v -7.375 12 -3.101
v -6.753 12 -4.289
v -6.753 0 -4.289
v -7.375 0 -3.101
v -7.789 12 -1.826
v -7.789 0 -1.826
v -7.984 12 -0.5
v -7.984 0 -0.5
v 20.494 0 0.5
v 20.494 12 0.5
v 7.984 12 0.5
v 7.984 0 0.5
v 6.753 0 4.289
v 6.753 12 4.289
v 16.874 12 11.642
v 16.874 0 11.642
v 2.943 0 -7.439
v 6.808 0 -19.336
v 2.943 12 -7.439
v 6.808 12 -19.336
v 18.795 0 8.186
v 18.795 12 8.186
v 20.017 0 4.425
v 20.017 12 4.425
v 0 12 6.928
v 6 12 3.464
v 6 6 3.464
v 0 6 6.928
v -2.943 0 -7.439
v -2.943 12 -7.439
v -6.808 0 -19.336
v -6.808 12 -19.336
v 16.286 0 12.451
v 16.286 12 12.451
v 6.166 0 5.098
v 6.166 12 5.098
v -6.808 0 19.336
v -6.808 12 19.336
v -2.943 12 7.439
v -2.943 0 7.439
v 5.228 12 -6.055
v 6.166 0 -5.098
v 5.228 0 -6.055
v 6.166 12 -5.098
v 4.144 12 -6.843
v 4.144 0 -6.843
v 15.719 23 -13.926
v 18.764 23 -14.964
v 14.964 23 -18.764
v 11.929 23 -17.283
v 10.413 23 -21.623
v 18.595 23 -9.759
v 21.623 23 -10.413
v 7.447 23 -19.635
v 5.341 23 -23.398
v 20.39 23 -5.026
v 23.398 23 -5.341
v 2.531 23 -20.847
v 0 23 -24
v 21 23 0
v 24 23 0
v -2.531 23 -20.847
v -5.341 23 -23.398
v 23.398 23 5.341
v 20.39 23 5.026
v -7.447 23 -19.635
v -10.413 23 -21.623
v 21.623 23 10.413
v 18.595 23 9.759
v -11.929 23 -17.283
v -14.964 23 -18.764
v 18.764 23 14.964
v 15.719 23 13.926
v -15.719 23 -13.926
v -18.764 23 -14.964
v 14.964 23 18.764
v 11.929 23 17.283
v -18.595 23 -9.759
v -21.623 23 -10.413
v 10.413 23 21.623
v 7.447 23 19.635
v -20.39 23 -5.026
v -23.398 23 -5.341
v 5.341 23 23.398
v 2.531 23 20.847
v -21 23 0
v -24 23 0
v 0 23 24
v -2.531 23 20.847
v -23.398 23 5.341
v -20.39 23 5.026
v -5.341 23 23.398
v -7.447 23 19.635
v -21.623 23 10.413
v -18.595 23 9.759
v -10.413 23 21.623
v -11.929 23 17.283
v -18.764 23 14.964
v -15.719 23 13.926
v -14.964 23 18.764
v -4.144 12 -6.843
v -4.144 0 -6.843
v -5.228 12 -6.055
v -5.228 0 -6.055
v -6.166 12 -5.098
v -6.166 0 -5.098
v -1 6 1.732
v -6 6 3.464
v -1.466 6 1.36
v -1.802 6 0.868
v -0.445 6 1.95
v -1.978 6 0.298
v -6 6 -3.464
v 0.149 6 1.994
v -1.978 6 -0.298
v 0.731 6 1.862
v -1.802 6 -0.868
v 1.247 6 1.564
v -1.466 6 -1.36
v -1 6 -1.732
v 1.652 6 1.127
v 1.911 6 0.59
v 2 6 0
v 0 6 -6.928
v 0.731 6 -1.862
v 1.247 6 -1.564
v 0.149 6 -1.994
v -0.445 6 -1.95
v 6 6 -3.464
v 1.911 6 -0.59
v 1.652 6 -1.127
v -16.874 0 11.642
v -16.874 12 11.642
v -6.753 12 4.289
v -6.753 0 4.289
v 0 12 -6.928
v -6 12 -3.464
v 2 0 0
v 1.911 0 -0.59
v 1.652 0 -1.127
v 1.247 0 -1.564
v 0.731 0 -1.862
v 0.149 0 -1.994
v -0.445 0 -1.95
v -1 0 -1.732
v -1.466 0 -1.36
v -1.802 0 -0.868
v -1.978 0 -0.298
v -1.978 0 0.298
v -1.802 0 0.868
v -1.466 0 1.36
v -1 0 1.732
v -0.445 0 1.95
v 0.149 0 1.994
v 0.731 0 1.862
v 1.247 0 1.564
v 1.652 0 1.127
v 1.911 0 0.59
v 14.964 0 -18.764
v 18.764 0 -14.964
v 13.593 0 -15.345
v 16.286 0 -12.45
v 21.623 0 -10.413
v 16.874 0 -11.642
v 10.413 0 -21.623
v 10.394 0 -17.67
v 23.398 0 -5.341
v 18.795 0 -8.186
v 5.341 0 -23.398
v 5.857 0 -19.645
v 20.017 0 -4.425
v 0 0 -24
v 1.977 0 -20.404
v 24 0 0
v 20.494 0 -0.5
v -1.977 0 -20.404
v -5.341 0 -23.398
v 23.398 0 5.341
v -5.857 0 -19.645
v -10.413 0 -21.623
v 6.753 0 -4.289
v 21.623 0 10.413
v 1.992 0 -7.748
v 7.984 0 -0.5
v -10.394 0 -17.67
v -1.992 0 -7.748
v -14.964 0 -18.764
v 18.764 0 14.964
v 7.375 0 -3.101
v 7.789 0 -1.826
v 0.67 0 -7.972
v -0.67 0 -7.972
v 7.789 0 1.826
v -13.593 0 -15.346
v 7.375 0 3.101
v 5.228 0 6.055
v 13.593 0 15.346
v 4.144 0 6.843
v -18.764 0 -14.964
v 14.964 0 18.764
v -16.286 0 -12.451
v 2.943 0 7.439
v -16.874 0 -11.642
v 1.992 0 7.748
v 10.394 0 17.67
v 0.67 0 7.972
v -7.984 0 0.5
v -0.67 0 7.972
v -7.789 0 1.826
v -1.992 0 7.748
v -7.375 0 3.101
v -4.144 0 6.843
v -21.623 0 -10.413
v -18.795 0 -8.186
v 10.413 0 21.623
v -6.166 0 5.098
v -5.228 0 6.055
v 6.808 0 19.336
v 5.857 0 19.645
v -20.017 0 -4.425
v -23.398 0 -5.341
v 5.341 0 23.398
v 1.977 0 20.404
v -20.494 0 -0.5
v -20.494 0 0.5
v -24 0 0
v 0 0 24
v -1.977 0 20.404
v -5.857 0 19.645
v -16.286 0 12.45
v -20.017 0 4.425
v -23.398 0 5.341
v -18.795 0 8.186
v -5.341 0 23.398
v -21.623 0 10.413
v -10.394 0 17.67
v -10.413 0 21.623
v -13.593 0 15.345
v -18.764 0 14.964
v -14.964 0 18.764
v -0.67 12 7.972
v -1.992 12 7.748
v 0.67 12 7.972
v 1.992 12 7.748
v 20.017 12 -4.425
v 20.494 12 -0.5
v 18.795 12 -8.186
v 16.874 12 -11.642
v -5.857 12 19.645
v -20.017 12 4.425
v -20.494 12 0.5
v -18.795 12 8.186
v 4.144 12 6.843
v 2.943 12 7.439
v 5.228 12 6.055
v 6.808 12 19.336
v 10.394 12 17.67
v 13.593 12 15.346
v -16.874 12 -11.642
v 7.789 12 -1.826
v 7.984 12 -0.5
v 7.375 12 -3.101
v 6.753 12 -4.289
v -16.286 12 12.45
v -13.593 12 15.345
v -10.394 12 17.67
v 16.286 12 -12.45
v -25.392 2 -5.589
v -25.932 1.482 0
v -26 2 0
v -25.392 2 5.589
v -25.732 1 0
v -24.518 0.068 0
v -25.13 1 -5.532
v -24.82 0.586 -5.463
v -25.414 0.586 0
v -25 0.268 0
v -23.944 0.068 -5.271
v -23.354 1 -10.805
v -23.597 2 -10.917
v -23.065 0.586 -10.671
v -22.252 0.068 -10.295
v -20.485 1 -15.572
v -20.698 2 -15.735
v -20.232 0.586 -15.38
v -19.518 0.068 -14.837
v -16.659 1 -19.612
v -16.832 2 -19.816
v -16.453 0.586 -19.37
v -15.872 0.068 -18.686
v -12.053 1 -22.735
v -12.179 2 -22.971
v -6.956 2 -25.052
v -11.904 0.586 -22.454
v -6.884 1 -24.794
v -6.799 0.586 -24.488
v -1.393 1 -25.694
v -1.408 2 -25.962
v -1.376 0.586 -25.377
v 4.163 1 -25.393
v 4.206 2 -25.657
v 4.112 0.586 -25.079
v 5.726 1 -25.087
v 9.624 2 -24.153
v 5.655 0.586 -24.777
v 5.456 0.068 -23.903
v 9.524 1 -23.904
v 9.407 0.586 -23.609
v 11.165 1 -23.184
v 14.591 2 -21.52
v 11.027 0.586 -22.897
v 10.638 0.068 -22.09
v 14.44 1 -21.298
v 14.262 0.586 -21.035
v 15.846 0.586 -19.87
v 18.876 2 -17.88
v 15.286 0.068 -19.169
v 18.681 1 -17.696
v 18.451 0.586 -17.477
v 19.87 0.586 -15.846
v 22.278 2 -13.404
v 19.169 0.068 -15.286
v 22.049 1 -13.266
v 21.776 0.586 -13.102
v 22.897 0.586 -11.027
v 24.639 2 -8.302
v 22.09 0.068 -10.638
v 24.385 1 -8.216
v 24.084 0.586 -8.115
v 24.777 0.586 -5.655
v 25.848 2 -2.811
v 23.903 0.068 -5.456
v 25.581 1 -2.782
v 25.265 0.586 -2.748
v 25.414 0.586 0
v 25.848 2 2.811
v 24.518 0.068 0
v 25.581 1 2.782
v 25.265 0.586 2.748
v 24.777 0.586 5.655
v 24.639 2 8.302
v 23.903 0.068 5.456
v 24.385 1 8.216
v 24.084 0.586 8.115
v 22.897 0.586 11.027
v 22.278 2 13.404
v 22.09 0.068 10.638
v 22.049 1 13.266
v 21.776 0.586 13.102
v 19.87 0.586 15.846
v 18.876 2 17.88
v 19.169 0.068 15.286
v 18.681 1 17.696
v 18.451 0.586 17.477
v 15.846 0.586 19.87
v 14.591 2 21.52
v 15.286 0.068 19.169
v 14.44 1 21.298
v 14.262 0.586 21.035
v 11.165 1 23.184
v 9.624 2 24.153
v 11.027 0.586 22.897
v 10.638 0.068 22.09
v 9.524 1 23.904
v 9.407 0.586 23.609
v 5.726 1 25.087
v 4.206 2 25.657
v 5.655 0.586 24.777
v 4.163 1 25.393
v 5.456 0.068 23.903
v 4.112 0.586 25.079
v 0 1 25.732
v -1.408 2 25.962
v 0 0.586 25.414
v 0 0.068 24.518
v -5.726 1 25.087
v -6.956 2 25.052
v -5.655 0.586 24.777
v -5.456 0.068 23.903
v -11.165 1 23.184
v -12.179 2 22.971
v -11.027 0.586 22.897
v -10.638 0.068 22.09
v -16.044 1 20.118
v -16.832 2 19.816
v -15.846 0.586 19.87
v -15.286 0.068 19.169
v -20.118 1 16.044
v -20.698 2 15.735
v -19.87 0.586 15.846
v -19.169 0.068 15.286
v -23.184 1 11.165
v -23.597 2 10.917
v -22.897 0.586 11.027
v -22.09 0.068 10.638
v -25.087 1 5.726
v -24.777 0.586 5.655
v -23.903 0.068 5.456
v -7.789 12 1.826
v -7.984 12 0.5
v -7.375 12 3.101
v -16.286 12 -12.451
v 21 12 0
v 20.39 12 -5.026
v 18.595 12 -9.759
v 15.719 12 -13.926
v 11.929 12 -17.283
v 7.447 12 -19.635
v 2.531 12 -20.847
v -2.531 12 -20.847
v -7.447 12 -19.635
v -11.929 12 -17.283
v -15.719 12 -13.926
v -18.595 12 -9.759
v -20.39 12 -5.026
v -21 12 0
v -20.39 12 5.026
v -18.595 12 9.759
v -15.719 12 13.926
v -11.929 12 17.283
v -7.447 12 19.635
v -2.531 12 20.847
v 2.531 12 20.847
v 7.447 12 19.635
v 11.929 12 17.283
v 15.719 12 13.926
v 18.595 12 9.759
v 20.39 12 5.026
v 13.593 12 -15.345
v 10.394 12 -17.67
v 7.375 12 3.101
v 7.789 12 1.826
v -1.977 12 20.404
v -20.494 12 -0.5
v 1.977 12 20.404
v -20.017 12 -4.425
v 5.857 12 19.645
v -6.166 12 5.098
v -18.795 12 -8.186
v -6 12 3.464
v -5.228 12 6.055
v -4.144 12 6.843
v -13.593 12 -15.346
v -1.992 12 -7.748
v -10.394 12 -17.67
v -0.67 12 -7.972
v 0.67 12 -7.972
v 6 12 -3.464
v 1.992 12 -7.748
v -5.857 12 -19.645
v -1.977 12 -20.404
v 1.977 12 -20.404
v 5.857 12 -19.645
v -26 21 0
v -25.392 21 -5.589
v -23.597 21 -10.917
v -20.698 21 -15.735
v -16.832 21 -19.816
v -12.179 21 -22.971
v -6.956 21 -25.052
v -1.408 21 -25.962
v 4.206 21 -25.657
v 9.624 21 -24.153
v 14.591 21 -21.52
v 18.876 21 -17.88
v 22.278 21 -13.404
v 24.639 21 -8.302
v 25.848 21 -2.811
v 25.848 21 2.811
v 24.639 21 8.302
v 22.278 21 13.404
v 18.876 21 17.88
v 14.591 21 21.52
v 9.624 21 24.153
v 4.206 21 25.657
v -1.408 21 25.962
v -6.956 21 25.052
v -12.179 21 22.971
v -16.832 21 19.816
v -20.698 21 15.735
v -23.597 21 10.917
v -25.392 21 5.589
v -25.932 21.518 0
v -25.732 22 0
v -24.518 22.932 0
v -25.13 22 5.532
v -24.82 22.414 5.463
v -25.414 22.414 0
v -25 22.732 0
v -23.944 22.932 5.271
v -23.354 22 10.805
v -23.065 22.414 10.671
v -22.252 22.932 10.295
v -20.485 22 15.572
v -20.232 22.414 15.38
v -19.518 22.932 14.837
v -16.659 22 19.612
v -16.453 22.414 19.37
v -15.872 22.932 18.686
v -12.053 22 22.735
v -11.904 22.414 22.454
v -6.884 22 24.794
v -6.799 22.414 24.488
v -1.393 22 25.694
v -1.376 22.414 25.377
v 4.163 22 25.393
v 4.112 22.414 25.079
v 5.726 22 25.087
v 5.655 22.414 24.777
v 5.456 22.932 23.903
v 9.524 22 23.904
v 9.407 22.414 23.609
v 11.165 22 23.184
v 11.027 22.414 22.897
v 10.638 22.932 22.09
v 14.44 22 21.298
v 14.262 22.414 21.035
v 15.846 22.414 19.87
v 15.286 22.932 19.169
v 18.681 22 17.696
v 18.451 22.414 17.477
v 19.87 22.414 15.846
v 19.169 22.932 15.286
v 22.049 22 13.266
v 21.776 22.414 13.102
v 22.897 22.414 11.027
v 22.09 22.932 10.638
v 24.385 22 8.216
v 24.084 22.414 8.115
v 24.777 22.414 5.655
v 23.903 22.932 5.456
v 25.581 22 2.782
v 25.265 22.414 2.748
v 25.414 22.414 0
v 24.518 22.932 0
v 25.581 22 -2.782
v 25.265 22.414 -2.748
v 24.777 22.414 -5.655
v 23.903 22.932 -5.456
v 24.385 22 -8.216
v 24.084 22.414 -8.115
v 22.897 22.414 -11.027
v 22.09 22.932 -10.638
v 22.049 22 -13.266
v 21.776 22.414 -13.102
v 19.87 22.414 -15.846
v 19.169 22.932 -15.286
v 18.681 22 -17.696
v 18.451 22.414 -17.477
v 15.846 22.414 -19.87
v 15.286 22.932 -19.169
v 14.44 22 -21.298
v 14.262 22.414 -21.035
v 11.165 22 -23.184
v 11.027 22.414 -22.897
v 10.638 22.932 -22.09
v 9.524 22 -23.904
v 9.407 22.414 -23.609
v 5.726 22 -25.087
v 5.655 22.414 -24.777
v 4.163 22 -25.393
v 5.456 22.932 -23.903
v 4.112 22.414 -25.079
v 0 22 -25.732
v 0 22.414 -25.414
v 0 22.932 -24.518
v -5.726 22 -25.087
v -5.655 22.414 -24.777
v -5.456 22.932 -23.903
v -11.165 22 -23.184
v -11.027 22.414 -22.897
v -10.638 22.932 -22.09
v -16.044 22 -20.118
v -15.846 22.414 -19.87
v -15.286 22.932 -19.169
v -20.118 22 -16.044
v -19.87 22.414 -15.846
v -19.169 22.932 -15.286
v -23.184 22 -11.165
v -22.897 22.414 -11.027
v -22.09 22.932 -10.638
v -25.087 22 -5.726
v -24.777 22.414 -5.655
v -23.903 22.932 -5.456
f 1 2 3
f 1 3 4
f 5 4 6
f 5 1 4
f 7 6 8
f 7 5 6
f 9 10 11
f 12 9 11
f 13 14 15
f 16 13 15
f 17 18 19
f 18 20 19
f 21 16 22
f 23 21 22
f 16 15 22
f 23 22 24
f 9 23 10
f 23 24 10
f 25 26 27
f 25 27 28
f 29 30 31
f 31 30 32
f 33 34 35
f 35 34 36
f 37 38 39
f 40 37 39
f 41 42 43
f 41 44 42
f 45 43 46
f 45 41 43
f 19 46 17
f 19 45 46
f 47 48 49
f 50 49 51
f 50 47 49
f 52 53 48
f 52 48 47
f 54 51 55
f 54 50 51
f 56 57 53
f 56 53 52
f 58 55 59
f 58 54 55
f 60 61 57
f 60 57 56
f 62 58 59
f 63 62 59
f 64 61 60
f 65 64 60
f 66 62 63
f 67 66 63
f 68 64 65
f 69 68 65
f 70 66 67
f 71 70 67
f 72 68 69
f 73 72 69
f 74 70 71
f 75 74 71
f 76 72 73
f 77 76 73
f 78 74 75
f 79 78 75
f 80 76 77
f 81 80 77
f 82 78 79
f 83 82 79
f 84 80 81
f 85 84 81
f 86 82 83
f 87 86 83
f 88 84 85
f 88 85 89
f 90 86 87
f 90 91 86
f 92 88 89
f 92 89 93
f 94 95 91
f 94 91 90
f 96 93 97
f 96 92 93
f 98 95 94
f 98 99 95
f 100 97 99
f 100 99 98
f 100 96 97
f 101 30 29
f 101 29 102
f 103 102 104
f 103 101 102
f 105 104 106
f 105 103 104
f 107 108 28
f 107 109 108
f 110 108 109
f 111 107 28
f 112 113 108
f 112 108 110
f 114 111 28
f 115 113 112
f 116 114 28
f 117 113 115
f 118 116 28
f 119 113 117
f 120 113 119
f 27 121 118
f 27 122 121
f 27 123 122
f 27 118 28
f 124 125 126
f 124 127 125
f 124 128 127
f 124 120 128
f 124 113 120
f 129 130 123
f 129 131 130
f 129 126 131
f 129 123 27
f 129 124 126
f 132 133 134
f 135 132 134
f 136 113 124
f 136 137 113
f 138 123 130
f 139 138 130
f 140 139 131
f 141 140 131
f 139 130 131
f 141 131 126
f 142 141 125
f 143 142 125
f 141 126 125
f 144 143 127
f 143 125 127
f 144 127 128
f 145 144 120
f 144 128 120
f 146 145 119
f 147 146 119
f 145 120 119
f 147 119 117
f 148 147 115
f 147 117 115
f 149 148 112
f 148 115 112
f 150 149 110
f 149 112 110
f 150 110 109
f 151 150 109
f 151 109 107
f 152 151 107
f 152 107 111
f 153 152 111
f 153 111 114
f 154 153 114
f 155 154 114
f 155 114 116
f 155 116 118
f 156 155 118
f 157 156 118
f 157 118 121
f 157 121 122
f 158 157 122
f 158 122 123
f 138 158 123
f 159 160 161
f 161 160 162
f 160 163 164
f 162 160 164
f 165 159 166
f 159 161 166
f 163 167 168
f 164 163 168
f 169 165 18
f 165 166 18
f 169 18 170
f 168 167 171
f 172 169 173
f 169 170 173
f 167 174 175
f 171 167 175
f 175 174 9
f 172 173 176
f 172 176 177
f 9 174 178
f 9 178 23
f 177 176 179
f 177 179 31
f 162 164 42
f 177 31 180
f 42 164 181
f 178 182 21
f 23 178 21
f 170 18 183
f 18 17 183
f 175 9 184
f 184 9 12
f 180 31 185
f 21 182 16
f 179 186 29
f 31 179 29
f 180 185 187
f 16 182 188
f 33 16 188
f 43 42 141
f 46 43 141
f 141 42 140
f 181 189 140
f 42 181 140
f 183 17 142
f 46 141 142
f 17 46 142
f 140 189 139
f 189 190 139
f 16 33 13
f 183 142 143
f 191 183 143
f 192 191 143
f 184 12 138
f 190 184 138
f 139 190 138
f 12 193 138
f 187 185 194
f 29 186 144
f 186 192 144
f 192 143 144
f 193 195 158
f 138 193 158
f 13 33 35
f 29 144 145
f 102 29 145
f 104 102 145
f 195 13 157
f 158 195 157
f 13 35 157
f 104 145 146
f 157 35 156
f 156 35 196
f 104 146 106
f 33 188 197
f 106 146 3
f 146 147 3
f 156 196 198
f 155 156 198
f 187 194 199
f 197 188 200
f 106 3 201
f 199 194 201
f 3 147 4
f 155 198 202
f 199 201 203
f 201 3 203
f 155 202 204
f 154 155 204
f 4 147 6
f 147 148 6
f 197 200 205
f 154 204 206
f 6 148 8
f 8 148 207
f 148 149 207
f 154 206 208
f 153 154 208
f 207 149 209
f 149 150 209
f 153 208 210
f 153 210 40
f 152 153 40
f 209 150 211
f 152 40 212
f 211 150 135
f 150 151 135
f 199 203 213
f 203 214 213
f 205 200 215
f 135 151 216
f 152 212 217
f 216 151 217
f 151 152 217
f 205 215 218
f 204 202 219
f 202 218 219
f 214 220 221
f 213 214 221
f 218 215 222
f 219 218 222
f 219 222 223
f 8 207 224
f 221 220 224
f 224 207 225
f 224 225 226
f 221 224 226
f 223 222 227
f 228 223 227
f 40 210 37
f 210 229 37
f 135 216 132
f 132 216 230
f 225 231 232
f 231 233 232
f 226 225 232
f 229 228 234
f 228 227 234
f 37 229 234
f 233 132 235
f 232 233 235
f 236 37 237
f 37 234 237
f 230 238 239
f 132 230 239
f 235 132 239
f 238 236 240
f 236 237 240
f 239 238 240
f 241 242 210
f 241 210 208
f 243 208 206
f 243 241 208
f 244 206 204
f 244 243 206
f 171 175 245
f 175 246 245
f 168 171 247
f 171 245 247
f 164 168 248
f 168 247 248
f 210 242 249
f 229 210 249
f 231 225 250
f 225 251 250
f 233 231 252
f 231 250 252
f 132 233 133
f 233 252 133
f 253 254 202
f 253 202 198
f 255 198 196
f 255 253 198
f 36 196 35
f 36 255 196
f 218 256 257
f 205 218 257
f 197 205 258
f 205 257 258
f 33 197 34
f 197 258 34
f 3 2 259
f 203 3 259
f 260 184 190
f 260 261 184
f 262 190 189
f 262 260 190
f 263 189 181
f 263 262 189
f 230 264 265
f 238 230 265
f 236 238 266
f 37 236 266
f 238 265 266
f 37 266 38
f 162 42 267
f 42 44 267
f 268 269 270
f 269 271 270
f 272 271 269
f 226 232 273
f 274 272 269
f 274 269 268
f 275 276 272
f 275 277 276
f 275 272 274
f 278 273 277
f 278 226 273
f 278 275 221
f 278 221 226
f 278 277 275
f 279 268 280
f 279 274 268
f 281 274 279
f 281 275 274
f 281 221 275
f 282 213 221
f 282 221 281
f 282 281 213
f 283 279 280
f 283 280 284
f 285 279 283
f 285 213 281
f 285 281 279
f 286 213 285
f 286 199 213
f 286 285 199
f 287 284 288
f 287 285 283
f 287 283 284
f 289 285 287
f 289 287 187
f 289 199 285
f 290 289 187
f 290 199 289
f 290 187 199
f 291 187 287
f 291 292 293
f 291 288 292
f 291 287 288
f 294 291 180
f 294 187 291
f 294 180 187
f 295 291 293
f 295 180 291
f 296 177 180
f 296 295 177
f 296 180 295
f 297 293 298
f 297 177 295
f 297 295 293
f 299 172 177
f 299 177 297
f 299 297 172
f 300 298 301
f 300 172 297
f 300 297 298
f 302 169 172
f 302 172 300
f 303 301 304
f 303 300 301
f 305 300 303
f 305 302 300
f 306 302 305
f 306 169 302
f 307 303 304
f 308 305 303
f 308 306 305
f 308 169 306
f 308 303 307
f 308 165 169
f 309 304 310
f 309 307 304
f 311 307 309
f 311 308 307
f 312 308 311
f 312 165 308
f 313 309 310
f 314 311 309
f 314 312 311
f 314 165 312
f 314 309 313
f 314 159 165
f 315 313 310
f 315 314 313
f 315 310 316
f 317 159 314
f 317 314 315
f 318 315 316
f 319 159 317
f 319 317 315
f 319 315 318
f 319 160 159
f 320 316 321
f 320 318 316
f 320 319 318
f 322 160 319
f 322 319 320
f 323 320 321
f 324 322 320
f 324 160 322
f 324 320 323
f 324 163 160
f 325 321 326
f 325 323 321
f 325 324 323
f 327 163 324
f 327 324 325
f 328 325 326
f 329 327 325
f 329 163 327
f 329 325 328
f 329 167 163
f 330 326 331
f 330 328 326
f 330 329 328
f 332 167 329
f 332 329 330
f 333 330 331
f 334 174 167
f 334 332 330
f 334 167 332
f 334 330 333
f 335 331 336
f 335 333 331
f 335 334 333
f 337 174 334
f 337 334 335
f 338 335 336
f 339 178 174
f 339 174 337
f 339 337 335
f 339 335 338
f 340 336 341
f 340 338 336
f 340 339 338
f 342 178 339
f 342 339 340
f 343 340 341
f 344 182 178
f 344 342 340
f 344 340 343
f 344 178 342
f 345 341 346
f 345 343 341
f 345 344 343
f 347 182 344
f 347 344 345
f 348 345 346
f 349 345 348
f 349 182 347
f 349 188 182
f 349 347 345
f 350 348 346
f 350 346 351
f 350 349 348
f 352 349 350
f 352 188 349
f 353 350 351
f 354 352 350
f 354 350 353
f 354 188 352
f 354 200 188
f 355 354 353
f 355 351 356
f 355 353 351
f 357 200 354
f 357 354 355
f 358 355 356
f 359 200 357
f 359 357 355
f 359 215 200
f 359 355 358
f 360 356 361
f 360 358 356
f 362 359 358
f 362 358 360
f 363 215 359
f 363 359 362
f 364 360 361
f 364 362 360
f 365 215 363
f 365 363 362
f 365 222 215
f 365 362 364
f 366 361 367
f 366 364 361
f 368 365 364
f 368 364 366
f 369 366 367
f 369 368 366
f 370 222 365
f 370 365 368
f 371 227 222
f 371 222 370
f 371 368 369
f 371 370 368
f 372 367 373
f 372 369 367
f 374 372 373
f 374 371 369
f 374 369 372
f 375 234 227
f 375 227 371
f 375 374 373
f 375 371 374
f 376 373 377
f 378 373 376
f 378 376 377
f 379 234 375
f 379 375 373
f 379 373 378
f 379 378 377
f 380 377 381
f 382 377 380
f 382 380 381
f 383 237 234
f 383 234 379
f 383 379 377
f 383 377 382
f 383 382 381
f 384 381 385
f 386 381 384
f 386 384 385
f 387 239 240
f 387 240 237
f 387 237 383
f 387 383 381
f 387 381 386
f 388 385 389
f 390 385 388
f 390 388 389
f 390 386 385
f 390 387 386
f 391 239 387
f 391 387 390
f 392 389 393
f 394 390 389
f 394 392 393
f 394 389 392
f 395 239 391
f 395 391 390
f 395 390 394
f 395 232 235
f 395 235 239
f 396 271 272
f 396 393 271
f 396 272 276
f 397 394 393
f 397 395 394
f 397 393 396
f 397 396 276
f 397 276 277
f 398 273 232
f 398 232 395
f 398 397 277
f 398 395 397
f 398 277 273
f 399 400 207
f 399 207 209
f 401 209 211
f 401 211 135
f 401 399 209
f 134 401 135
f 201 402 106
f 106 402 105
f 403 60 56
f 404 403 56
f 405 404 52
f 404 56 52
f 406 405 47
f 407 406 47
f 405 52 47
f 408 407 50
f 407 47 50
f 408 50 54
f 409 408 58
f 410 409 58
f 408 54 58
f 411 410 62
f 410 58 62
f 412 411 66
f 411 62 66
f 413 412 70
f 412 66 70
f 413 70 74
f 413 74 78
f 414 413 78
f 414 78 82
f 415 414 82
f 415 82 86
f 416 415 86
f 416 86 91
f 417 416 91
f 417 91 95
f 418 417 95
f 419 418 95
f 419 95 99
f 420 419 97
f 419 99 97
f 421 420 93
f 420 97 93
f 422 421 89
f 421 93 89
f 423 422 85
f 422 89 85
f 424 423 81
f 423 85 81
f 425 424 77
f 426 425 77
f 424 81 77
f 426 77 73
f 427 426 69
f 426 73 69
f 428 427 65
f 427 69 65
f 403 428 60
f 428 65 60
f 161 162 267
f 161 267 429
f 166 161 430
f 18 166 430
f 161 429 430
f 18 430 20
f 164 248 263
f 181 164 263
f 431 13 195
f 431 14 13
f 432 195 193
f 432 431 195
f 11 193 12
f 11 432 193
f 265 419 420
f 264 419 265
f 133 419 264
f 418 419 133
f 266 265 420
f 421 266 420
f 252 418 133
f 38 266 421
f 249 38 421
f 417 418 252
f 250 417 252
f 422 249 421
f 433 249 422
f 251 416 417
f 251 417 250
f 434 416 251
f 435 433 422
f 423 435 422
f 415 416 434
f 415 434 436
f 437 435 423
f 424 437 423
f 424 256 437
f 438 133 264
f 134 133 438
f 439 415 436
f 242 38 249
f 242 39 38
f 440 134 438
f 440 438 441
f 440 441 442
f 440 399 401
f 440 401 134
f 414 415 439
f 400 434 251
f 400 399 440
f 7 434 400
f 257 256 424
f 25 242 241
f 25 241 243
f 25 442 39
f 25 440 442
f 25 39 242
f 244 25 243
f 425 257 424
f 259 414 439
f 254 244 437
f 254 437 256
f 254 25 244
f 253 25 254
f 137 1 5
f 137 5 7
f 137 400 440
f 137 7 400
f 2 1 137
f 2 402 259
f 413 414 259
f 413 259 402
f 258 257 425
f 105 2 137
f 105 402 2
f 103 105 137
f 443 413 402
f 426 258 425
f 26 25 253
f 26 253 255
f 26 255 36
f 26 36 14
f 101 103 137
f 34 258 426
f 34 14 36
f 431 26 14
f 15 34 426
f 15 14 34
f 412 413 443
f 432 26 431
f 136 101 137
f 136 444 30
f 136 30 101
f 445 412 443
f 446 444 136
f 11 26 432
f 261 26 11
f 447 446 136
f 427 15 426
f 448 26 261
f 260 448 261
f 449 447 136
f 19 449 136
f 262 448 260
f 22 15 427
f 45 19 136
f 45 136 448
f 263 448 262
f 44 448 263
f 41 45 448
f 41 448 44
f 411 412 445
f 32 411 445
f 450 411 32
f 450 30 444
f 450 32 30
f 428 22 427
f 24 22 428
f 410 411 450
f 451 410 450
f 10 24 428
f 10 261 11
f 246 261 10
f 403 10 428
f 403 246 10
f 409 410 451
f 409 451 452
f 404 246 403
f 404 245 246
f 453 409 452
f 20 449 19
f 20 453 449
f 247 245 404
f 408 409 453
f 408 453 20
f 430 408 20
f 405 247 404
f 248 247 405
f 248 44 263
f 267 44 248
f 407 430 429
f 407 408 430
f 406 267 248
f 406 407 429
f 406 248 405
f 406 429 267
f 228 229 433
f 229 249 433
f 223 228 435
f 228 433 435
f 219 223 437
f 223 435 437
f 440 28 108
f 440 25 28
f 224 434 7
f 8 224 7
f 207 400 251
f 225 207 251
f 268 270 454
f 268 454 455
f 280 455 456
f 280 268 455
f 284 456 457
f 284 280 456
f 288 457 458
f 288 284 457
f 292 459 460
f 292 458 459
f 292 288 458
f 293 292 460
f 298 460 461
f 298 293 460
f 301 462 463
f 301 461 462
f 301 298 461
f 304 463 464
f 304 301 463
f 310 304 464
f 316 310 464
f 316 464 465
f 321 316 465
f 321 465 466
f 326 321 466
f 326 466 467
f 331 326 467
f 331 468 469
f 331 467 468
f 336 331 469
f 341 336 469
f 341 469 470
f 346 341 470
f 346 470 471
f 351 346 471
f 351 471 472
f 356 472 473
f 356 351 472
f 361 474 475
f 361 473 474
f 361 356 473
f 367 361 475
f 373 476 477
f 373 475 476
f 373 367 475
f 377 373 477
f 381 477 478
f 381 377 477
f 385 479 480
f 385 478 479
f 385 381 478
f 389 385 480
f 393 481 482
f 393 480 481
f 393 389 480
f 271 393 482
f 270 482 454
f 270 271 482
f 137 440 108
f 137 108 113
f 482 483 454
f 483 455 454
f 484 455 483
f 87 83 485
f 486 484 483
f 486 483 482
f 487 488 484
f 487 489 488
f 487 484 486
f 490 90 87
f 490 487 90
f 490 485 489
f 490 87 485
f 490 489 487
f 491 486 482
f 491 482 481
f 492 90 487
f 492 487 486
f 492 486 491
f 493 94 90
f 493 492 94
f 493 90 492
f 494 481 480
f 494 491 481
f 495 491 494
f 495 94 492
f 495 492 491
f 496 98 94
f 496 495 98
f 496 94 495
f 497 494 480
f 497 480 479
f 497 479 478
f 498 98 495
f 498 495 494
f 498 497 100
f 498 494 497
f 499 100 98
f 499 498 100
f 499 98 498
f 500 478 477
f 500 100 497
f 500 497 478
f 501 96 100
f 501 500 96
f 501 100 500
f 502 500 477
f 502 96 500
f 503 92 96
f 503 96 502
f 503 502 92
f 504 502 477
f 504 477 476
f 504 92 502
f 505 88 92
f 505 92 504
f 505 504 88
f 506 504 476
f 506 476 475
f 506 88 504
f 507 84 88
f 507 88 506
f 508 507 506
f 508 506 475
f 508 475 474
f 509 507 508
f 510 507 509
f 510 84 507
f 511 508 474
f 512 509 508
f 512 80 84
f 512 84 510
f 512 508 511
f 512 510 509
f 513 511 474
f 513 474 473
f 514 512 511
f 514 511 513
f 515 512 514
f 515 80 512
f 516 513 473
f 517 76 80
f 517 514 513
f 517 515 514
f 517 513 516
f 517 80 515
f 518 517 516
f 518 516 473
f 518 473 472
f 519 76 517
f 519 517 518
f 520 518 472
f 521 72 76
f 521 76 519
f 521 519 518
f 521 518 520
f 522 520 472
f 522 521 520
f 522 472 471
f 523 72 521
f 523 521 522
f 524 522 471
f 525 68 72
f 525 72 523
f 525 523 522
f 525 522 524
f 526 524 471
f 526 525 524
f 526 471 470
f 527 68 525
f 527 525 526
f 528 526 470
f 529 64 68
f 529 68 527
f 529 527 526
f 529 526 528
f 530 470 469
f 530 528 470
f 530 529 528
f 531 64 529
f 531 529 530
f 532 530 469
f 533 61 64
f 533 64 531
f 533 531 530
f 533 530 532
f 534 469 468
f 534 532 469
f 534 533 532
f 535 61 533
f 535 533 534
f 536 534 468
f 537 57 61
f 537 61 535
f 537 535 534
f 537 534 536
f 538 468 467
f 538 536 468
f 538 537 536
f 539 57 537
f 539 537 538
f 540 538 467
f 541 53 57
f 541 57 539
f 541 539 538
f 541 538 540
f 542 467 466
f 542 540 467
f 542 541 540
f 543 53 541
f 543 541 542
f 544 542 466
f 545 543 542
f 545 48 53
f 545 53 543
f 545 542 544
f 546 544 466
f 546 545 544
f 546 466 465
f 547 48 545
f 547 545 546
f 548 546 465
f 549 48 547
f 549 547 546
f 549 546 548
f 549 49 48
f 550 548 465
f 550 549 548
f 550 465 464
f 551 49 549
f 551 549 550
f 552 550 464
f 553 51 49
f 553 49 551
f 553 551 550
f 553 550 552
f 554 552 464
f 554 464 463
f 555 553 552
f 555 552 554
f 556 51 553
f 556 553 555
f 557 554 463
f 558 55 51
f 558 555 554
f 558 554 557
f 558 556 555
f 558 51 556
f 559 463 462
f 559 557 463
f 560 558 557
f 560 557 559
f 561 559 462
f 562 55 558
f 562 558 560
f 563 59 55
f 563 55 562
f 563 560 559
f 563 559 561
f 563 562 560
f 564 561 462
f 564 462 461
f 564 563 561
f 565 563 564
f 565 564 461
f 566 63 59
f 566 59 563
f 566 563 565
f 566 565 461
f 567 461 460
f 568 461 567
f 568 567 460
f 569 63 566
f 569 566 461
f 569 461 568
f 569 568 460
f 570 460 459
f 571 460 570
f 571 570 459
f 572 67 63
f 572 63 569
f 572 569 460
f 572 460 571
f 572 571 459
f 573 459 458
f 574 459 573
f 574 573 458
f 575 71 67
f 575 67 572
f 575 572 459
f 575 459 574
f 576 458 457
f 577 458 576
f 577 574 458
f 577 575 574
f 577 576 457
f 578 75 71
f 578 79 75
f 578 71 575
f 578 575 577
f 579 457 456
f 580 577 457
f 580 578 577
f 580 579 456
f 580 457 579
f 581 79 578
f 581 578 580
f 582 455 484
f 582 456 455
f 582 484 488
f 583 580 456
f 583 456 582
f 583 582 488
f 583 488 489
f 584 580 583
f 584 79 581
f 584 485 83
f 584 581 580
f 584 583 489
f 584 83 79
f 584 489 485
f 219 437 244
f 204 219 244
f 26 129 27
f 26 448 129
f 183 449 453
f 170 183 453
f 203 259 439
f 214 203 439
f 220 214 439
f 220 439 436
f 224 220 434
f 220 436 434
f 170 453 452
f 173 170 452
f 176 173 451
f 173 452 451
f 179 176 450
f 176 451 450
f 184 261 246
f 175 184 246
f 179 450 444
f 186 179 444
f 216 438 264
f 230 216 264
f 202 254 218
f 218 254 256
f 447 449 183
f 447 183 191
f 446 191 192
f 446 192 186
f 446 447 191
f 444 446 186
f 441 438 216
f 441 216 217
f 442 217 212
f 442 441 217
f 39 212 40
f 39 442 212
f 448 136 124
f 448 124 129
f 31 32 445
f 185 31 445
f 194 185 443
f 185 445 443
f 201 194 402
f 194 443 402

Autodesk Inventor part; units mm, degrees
ref_plane "YZ Plane" through (0, 0, 0) normal (1, 0, 0) x (0, 1, 0)
ref_plane "XZ Plane" through (0, 0, 0) normal (0, 1, 0) x (-1, 0, 0)
ref_plane "XY Plane" through (0, 0, 0) normal (0, 0, 1) x (1, 0, 0)
sketch "草圖1" plane through (0, 0, 0) normal (0, 1, 0) x (-1, 0, 0)
  circle A0 centre (0, 0) radius 26
  dimension "d0" = 52
extrude "擠出1" add sketch "草圖1" along normal blind 23
fillet "圓角1" radius 2 2 edges at (26, 23, 0) (26, 0, 0)
sketch "草圖2" plane through (0, 23, 0) normal (0, 1, 0) x (1, 0, 0)
  circle A0 centre (0, 0) radius 21
  dimension "d4" = 42
extrude "擠出2" cut sketch "草圖2" against normal blind 11
sketch "草圖3" plane through (0, 12, 0) normal (0, 1, 0) x (1, 0, 0)
  circle A0 centre (0, 0) radius 8
  line L0 (-6, 3.4641) -> (0, 6.9282)
  line L1 (0, 6.9282) -> (6, 3.4641)
  line L2 (6, 3.4641) -> (6, -3.4641)
  line L3 (6, -3.4641) -> (0, -6.9282)
  line L4 (0, -6.9282) -> (-6, -3.4641)
  line L5 (-6, -3.4641) -> (-6, 3.4641)
  dimension "d7" = 12
  dimension "d8" = 16
extrude "擠出3" cut sketch "草圖3" against normal blind 6 contours L0 L1 L2 L3 L4 L5
sketch "草圖4" plane through (0, 12, 0) normal (0, 1, 0) x (1, 0, 0)
  circle A0 centre (0, 0) radius 21 projected
  circle A1 centre (0, 0) radius 8 projected
  line L0 (0, 0) -> (-21, 0)
  line L1 (0, 0) -> (-16.9894, 12.3435)
  circle A2 centre (0, 0) radius 21 projected
  line L2 (-21, 0.5) -> (-1.5388, 0.5)
  line L3 (-1.5388, 0.5) -> (-17.2832, 11.939)
  circle A3 centre (0, 0) radius 20.5
  point P0 (-16.8738, 11.6415)
  point P1 (-20.4939, 0.5)
  point P2 (-7.9844, 0.5)
  point P3 (-6.7534, 4.2886)
  dimension "d11" = 36
  dimension "d12" = 0.5
  dimension "d13" = 0.5
extrude "擠出4" cut sketch "草圖4" against normal through all contours L3 A1 L2 A3
pattern_circular "環形陣列1" count 10 over 360 about axis through (0, -10, 0) along (0, 1, 0) of "擠出4"
sketch "草圖5" plane through (0, 6, 0) normal (0, 1, 0) x (1, 0, 0)
  circle A0 centre (0, 0) radius 2
  dimension "d19" = 4
extrude "擠出5" cut sketch "草圖5" against normal through all
sketch "草圖6" plane through (0, 23, 0) normal (0, 1, 0) x (1, 0, 0)
  circle A0 centre (0, 0) radius 26 projected
  line L0 (48.5339, -26) -> (-4.5845, -26)
  line L1 (-4.5845, -26) -> (-136.2974, 21.9396)
  line L2 (0, 0) -> (-8.8925, -24.432)
  line L3 (0, 36.4) -> (0, -36.4) projected
  line L4 (4.5845, -26) -> (40.2795, -13.0081)
  dimension "d22" = 20
  dimension "d23" = 20
properties part number "wheel"
